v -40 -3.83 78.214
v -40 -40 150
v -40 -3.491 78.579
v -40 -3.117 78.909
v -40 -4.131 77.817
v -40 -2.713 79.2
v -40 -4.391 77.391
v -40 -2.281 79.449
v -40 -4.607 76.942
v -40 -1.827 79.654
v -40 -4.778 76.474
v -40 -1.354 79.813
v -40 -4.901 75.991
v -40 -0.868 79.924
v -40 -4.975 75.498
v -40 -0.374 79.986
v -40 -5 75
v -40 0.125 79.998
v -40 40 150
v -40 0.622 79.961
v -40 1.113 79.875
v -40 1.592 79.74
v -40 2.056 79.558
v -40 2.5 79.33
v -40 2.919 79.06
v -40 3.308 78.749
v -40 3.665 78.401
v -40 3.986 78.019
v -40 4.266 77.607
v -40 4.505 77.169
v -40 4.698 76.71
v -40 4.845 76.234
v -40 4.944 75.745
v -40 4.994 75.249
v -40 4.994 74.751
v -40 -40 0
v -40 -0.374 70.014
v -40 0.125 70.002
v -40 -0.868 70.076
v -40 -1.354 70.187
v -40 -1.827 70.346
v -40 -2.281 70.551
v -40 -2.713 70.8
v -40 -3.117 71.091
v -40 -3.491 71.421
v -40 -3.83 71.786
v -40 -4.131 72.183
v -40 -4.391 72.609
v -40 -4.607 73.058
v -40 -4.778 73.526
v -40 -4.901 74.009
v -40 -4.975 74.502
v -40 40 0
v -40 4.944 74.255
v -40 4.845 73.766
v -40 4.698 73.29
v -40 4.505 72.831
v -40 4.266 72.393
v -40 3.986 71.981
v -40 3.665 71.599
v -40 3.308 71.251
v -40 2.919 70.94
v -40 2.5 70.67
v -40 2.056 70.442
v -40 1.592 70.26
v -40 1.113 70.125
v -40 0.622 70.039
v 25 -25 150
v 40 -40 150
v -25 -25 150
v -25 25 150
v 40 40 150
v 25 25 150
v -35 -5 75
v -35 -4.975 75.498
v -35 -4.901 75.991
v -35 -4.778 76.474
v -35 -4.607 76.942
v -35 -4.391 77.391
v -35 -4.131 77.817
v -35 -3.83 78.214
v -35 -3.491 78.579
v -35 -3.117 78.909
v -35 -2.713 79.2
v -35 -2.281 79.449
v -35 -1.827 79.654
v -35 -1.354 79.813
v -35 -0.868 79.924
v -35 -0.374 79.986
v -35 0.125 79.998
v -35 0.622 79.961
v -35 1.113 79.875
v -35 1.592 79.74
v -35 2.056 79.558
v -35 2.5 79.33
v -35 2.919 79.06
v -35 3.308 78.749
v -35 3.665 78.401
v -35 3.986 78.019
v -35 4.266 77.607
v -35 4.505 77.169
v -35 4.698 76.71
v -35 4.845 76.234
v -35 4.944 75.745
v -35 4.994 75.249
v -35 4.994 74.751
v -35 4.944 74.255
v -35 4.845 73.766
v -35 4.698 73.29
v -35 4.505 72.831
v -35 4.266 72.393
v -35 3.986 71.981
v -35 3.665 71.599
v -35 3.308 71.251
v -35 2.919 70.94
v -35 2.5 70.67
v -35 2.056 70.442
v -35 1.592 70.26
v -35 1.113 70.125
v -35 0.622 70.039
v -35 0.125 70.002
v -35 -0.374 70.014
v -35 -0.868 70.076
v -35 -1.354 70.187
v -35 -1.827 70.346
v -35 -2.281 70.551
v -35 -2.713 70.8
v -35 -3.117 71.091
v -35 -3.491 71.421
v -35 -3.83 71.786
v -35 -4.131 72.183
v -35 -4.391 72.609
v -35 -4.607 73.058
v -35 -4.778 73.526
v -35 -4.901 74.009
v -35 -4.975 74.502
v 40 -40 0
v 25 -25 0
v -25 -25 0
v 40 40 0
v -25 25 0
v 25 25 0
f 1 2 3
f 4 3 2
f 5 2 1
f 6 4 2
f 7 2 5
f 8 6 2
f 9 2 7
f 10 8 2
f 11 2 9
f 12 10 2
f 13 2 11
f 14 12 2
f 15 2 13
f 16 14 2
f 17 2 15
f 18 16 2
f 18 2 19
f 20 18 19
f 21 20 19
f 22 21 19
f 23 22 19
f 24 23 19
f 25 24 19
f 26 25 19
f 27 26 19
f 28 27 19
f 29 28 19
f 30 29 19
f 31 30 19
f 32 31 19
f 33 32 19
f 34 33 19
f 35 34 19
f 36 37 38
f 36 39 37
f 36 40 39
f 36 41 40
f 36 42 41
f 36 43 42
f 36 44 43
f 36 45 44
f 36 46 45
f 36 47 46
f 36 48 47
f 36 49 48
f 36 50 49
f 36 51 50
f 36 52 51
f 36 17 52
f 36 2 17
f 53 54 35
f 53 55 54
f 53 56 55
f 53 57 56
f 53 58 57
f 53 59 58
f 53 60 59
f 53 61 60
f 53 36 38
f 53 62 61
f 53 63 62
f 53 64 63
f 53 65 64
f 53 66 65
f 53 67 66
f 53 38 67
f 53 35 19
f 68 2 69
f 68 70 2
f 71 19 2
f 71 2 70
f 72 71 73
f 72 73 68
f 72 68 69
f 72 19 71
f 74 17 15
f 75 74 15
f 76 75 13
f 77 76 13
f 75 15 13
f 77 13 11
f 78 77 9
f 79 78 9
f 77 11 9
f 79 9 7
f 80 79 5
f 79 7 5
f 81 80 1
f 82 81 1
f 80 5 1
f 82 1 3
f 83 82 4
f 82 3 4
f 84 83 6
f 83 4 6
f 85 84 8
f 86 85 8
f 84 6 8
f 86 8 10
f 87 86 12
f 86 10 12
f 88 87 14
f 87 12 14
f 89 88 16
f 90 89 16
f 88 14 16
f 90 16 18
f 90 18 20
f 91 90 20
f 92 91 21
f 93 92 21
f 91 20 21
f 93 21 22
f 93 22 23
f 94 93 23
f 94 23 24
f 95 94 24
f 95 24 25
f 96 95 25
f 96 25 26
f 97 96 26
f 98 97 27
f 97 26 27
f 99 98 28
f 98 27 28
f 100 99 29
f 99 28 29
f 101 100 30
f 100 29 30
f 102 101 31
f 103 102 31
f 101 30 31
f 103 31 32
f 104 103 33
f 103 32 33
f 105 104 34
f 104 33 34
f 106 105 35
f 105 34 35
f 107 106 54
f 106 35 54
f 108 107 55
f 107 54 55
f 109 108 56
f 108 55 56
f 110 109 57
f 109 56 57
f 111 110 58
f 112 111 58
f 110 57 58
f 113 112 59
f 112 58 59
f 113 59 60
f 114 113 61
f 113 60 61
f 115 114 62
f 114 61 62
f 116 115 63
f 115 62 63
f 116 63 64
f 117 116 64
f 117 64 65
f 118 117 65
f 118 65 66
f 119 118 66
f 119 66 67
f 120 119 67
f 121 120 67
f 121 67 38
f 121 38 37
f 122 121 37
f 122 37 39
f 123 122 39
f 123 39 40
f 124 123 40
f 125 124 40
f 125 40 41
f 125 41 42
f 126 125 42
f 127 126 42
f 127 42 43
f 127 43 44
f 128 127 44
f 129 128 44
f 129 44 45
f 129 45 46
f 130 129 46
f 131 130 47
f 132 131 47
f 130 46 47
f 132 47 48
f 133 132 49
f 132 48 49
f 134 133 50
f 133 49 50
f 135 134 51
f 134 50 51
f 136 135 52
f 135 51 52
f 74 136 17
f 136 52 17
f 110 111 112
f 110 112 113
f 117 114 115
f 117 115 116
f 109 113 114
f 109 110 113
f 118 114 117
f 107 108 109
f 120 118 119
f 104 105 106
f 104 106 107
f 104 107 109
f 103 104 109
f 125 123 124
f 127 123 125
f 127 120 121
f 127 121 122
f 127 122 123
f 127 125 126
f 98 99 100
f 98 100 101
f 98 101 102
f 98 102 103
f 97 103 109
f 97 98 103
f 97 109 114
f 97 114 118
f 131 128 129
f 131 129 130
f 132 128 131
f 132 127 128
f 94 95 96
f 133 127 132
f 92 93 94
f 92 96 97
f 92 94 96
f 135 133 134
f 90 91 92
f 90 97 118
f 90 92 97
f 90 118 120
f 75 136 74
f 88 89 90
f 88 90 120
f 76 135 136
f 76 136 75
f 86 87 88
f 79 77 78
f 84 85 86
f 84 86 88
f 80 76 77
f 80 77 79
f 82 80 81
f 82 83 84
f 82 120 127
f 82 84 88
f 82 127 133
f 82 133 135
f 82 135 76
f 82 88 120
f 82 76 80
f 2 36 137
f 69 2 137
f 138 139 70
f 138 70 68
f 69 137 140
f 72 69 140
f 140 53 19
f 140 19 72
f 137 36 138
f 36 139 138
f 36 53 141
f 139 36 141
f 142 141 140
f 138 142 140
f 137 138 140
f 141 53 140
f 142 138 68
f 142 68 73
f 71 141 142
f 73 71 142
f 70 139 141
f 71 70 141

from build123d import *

# Parameters (mm, degrees)
SKETCH1_W           = 80
SKETCH1_H           = 80
SKETCH1_W_2         = 50
SKETCH1_H_2         = 50
BOSS_EXTRUDE1_DEPTH = 150
SKETCH2_R           = 5
CUT_EXTRUDE1_DEPTH  = 5


with BuildPart() as part:
    # Sketch1 → Boss-Extrude1 (new body)
    with BuildSketch(Plane.XY):
        Rectangle(SKETCH1_W, SKETCH1_H)
        Rectangle(SKETCH1_W_2, SKETCH1_H_2, mode=Mode.SUBTRACT)
    extrude(amount=BOSS_EXTRUDE1_DEPTH)

    # Sketch2 → Cut-Extrude1 (cut)
    with BuildSketch(Plane.ZY.offset(40)):
        with Locations(Location((75, 0, 0), (0, 0, 270))):
            Circle(SKETCH2_R)
    extrude(amount=-CUT_EXTRUDE1_DEPTH, mode=Mode.SUBTRACT)


solid = part.part
